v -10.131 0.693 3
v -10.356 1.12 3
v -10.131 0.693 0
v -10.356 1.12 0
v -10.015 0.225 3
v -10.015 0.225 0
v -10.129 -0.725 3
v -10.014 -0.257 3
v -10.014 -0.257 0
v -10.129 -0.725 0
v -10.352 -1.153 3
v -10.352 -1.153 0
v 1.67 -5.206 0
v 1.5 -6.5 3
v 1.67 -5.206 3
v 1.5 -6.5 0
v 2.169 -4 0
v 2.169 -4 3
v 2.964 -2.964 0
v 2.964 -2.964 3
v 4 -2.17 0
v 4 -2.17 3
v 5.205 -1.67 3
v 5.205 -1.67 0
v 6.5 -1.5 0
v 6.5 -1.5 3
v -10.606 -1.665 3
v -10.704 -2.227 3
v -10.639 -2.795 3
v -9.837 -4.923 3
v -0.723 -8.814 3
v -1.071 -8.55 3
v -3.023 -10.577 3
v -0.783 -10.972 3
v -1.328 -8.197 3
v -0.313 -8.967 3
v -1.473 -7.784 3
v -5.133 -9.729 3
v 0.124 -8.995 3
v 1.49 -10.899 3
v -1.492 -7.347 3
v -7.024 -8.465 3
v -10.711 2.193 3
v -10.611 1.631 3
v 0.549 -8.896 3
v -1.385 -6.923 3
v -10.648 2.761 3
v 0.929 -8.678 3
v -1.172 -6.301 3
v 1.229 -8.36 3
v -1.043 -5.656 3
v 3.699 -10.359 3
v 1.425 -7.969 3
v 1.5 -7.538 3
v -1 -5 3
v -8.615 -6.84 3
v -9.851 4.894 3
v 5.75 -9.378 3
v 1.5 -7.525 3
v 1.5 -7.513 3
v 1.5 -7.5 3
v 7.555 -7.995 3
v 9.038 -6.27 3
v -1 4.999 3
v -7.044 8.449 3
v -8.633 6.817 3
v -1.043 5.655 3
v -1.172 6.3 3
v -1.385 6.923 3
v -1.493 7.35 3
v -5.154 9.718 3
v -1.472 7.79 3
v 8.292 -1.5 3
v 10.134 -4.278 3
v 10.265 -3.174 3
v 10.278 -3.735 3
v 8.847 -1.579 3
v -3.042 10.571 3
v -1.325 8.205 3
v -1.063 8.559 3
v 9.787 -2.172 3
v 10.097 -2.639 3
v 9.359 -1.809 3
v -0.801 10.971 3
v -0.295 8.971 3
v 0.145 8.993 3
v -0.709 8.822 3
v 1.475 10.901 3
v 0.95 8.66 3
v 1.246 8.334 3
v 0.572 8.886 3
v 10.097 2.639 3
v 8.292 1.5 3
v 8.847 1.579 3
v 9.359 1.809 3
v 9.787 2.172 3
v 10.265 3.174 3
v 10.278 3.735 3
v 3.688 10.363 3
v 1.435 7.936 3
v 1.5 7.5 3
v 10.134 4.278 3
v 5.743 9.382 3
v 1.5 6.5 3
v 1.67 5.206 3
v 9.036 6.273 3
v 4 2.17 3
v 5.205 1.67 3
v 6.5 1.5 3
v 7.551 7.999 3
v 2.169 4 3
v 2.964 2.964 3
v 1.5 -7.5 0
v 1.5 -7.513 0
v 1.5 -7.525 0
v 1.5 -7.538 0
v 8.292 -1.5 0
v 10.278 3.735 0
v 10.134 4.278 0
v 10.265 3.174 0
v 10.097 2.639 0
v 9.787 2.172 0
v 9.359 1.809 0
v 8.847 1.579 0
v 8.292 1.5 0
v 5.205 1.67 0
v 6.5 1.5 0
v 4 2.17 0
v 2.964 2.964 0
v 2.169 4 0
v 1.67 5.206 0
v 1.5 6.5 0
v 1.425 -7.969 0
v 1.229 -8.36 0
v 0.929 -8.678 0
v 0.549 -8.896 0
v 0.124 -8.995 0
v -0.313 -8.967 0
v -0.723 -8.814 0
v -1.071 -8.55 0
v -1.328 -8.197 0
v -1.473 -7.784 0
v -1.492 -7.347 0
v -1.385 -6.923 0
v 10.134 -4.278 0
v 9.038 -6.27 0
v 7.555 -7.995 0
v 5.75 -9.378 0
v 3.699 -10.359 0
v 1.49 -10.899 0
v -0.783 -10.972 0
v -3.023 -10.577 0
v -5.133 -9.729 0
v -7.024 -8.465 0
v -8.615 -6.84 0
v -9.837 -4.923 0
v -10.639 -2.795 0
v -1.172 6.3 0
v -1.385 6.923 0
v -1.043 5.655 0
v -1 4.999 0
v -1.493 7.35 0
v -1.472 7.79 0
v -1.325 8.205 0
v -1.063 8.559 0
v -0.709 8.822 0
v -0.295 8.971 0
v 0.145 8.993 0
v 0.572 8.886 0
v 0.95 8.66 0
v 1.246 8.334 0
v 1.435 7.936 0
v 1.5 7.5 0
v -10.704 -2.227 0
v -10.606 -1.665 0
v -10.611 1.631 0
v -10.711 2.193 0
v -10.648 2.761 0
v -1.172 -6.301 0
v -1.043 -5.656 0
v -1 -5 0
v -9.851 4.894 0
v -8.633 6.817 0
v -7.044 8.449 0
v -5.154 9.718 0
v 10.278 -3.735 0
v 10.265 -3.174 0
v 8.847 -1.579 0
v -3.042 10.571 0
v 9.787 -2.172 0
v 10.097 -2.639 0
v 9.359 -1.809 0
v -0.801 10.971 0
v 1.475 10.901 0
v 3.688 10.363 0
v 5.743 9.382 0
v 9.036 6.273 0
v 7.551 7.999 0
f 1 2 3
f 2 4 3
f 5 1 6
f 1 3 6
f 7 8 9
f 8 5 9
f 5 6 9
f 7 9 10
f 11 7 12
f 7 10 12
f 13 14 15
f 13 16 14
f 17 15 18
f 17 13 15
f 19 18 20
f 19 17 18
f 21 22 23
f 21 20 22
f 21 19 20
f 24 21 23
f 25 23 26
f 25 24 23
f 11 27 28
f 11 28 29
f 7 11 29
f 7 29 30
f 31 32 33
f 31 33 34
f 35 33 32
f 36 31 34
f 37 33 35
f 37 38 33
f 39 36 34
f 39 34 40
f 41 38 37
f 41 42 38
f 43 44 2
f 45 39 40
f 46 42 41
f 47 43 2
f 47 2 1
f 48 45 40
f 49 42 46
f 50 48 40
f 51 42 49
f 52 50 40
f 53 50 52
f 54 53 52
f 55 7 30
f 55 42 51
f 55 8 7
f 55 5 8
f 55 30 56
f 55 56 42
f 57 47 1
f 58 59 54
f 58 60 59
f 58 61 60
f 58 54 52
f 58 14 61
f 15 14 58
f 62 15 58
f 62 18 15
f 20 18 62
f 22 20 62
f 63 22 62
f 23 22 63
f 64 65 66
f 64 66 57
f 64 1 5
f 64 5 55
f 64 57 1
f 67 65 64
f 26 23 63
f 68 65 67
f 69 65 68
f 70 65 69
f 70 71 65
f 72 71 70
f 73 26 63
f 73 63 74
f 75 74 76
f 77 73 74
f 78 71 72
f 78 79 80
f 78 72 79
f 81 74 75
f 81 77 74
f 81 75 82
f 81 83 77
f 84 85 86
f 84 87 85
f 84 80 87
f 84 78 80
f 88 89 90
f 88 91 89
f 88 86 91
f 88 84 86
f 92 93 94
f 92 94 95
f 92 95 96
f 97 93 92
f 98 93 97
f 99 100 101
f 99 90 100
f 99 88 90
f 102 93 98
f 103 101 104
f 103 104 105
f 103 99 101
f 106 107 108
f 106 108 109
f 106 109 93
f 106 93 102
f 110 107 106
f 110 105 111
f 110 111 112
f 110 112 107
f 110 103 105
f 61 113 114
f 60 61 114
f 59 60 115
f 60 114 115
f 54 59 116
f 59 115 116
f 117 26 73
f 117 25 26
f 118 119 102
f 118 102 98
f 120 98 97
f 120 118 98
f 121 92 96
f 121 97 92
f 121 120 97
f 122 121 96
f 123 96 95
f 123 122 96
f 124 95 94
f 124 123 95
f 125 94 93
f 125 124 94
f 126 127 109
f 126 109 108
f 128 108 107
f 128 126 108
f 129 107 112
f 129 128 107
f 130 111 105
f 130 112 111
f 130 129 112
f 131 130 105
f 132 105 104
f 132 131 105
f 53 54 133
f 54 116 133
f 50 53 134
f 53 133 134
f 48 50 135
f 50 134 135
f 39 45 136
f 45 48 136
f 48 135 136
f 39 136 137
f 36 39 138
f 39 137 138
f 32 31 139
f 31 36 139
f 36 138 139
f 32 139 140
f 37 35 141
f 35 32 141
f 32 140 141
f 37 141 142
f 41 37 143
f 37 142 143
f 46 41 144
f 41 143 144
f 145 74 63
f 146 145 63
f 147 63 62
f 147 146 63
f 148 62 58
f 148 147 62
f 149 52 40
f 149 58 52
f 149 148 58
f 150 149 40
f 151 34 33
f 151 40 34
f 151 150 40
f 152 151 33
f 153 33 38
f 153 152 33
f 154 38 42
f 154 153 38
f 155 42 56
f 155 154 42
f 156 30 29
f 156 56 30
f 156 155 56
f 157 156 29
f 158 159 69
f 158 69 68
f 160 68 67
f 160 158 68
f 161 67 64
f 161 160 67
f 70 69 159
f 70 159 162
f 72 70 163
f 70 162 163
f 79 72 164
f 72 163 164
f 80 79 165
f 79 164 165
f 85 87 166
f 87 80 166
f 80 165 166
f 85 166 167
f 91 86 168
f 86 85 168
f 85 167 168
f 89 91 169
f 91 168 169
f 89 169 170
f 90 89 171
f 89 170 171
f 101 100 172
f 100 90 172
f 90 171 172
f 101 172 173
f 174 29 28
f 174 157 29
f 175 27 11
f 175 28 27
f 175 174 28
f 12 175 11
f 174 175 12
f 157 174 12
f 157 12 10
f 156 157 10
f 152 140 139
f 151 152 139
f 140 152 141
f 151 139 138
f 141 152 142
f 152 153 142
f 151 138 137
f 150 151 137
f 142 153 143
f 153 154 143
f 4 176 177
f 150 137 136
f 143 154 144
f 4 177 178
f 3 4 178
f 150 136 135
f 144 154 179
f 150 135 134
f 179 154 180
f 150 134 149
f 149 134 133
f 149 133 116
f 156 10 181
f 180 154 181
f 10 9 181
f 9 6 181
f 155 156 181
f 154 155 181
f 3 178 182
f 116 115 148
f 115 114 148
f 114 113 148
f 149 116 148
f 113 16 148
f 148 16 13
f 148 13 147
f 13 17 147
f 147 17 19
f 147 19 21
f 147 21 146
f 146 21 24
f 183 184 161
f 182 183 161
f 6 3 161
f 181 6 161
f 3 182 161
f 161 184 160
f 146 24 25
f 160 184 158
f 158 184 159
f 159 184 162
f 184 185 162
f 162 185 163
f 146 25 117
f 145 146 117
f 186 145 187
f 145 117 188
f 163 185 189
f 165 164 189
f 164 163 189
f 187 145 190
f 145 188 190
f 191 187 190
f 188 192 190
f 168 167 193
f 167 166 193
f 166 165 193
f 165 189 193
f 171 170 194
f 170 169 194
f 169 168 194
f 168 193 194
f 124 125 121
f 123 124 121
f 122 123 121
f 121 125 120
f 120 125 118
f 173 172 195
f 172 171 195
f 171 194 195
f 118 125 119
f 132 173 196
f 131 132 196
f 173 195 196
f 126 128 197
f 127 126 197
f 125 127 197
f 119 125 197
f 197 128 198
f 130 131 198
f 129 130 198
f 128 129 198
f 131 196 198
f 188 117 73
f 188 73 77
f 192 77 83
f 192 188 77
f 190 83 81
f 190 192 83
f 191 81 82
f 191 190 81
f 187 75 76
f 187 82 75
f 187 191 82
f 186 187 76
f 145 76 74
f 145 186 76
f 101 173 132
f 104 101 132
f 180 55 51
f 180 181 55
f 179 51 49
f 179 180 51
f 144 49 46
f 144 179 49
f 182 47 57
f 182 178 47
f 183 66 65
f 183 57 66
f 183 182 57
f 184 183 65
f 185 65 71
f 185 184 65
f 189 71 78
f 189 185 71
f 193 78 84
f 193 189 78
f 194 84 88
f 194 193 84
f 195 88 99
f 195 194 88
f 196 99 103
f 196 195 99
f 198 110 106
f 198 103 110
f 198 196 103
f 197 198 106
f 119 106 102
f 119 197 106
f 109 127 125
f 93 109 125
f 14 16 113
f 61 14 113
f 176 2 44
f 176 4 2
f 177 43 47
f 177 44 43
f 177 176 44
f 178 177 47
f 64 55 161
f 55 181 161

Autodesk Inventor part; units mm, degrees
ref_plane "YZ Plane" through (0, 0, 0) normal (1, 0, 0) x (0, 1, 0)
ref_plane "XZ Plane" through (0, 0, 0) normal (0, 1, 0) x (-1, 0, 0)
ref_plane "XY Plane" through (0, 0, 0) normal (0, 0, 1) x (1, 0, 0)
sketch "Sketch1" plane through (0, 0, 0) normal (0, 0, 1) x (1, 0, 0)
  arc A0 (1.4995, 7.5) -> (-1.385, 6.9228) centre (-0.0005, 7.5) ccw
  arc A1 (-1.3846, -6.9231) -> (1.5, -7.5) centre (0, -7.5) ccw
  arc A2 (-10.3524, -1.1528) -> (-10.356, 1.1198) centre (-12, -0.0191) ccw
  arc A3 (10.1341, 4.2778) -> (-10.6479, 2.7607) centre (0, 0) ccw
  arc A4 (-10.6391, -2.7946) -> (10.1341, -4.2778) centre (0, 0) ccw
  arc A5 (-10.6479, 2.7607) -> (-10.356, 1.1198) centre (-8.7119, 2.2588) ccw
  arc A6 (-10.3524, -1.1528) -> (-10.6391, -2.7946) centre (-8.7047, -2.2865) ccw
  line L0 (-1, -5) -> (-1, 4.9988)
  arc A7 (-1, 4.9988) -> (-1.385, 6.9228) centre (-6, 4.9988) ccw
  arc A8 (-1.3846, -6.9231) -> (-1, -5) centre (-6, -5) ccw
  line L1 (1.4995, 7.5) -> (1.4995, 6.5)
  line L2 (1.4995, -6.5) -> (1.4995, -7.5382)
  line L3 (6.4995, -1.5) -> (8.2916, -1.5)
  line L4 (6.4995, 1.5) -> (8.2916, 1.5)
  arc A9 (6.4995, -1.5) -> (1.4995, -6.5) centre (6.4995, -6.5) ccw
  arc A10 (1.4995, 6.5) -> (6.4995, 1.5) centre (6.4995, 6.5) ccw
  arc A11 (10.1341, -4.2778) -> (8.2916, -1.5) centre (8.2916, -3.5) ccw
  arc A12 (8.2916, 1.5) -> (10.1341, 4.2778) centre (8.2916, 3.5) ccw
  point P0 (10.8972, -1.5)
  point P1 (10.8972, 1.5)
  point P2 (1.4995, 1.5)
  point P3 (1.4995, -1.5)
  point P4 (-1, -6.382)
  point P5 (-1, 6.3815)
  dimension "d5" = 3
  dimension "d6" = 3
  dimension "d7" = 15
  dimension "d18" = 7.5
  dimension "d20" = 4
  dimension "d21" = 12
  dimension "d22" = 2
  dimension "d26" = 5
  dimension "d27" = 5
  dimension "d28" = 2
extrude "Extrusion2" add sketch "Sketch1" along normal blind 3
properties part number "Middle Endcap080813" material "Polycarbonate, Clear"
